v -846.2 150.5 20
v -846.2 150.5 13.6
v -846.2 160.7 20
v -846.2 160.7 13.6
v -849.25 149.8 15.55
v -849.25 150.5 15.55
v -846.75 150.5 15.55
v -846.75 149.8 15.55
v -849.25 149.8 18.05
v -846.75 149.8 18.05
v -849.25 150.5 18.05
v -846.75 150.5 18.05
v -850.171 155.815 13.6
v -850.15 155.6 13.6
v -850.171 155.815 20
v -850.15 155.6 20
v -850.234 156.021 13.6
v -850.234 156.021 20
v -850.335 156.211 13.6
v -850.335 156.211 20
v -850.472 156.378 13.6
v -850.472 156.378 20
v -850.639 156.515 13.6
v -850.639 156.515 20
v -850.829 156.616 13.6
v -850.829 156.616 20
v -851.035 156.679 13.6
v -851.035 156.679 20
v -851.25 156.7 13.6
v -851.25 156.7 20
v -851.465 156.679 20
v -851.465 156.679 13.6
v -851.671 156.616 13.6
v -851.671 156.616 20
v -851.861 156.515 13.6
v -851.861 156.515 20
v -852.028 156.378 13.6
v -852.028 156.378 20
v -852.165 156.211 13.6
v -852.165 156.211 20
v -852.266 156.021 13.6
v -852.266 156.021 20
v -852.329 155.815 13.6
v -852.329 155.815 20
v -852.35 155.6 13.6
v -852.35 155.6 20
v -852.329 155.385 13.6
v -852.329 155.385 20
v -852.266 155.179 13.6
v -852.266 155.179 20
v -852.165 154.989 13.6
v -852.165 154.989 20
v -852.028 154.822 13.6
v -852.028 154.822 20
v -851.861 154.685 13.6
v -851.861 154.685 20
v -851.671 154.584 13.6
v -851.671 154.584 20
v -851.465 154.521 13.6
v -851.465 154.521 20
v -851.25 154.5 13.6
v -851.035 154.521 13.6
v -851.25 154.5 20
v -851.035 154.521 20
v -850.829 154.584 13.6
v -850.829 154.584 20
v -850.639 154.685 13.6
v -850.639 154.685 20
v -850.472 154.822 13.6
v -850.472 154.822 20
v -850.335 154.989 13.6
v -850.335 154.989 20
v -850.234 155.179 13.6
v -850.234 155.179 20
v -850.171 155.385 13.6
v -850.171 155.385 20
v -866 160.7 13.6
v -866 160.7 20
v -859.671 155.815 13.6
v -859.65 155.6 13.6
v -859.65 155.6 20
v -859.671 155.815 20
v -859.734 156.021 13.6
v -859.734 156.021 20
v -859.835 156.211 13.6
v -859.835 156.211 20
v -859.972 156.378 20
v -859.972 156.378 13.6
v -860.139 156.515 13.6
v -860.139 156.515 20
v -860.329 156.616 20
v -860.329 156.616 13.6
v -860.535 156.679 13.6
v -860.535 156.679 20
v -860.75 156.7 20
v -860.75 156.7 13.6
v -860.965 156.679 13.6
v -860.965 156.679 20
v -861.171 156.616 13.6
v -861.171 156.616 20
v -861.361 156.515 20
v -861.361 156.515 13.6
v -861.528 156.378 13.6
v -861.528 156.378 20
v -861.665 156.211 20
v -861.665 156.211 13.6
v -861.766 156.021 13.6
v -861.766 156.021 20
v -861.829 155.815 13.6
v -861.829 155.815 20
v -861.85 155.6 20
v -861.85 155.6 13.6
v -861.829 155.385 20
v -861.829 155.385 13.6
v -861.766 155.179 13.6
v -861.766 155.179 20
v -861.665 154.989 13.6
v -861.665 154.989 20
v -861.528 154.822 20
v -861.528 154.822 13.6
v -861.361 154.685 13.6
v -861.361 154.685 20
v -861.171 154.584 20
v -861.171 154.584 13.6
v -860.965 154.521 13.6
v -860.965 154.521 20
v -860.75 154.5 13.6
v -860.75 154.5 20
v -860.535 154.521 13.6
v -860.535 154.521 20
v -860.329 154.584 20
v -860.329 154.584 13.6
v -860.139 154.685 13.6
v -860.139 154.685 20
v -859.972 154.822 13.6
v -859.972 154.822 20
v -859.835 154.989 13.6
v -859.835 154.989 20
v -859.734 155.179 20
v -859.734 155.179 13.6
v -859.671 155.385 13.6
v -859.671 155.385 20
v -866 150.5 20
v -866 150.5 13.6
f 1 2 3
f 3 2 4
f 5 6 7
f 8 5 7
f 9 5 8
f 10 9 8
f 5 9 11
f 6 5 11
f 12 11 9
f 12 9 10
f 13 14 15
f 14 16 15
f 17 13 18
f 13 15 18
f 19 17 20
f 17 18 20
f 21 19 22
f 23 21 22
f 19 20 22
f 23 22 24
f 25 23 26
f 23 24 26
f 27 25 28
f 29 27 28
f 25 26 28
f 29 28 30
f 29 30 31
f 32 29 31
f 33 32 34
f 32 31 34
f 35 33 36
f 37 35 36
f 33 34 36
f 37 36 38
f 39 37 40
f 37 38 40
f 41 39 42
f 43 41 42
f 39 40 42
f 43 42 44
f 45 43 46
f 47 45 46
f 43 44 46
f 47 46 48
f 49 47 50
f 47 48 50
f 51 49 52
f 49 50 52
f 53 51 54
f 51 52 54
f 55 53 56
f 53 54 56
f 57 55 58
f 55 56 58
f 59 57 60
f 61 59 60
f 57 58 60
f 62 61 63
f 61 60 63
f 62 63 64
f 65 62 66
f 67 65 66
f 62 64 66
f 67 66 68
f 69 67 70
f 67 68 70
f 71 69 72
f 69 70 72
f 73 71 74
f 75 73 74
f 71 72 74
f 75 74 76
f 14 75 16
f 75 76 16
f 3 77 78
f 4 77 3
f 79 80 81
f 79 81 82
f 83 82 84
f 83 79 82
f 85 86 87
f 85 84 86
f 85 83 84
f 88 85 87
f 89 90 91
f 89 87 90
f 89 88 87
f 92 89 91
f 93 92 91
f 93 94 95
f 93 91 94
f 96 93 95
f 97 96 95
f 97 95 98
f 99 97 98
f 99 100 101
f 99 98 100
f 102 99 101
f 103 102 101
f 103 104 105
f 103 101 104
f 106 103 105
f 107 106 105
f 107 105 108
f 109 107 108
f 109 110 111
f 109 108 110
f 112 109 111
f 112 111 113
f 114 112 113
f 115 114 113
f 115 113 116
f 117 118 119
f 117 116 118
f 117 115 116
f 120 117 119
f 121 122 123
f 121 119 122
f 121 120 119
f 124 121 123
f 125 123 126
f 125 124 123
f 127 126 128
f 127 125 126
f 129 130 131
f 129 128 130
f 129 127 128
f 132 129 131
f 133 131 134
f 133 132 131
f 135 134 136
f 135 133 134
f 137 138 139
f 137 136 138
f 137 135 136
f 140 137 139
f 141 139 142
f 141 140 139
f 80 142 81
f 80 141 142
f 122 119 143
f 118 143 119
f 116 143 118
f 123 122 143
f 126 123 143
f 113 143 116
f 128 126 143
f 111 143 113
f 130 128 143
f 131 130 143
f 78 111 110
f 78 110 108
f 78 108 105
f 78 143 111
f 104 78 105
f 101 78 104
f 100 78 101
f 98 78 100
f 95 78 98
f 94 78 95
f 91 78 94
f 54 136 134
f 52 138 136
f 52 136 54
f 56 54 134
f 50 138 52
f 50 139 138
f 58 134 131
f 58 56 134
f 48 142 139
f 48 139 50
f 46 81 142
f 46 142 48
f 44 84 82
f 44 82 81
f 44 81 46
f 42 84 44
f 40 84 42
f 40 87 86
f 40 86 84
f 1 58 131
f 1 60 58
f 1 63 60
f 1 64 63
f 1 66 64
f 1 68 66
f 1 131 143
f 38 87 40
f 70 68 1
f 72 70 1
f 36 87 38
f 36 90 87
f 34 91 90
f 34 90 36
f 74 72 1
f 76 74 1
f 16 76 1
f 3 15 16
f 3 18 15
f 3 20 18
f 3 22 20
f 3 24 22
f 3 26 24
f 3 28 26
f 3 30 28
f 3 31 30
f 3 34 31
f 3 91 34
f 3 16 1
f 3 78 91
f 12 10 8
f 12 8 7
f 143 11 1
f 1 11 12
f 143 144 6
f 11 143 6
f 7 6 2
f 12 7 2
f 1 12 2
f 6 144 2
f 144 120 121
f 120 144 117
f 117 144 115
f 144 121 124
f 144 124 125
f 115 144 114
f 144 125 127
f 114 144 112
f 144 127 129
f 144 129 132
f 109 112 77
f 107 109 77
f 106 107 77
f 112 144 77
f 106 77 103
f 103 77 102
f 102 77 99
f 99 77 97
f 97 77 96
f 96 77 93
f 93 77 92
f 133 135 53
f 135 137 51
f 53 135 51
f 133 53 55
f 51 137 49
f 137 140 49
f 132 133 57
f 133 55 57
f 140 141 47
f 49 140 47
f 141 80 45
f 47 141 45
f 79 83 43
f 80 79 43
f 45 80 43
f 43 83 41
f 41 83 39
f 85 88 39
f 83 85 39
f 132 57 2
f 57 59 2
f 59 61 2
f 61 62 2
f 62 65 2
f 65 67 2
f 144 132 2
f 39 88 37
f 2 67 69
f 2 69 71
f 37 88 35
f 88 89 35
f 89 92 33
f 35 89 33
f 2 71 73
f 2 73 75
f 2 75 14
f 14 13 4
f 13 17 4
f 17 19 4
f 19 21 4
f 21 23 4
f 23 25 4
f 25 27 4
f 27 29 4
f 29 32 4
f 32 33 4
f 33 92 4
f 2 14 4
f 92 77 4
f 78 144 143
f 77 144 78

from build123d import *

# Parameters (mm, degrees)
CASE_SKETCH_W        = 19.8
CASE_SKETCH_H        = 10.2
CASE_2_DEPTH         = 6.4
SCREW_HOLES_SKETCH_R = 1.1
SCREW_HOLES_DEPTH    = 30
PLUNGER_SKETCH_W     = 2.5
PLUNGER_SKETCH_H     = 0.7
PLUNGER_DEPTH        = 2.5


with BuildPart() as part:
    # Case Sketch → Case 2 (new body)
    with BuildSketch(Plane.XY.offset(13.6)):
        with Locations((-856.1, 155.6)):
            Rectangle(CASE_SKETCH_W, CASE_SKETCH_H)
    extrude(amount=CASE_2_DEPTH)

    # Screw Holes Sketch → Screw Holes (cut, symmetric)
    with BuildSketch(Plane.XY):
        with Locations((-860.75, 155.6)):
            Circle(SCREW_HOLES_SKETCH_R)
        with Locations((-851.25, 155.6)):
            Circle(SCREW_HOLES_SKETCH_R)
    extrude(amount=SCREW_HOLES_DEPTH, both=True, mode=Mode.SUBTRACT)

    # Plunger Sketch → Plunger (add)
    with BuildSketch(Plane.XY.offset(15.55)):
        with Locations((-848, 150.15)):
            Rectangle(PLUNGER_SKETCH_W, PLUNGER_SKETCH_H)
    extrude(amount=PLUNGER_DEPTH)


solid = part.part
